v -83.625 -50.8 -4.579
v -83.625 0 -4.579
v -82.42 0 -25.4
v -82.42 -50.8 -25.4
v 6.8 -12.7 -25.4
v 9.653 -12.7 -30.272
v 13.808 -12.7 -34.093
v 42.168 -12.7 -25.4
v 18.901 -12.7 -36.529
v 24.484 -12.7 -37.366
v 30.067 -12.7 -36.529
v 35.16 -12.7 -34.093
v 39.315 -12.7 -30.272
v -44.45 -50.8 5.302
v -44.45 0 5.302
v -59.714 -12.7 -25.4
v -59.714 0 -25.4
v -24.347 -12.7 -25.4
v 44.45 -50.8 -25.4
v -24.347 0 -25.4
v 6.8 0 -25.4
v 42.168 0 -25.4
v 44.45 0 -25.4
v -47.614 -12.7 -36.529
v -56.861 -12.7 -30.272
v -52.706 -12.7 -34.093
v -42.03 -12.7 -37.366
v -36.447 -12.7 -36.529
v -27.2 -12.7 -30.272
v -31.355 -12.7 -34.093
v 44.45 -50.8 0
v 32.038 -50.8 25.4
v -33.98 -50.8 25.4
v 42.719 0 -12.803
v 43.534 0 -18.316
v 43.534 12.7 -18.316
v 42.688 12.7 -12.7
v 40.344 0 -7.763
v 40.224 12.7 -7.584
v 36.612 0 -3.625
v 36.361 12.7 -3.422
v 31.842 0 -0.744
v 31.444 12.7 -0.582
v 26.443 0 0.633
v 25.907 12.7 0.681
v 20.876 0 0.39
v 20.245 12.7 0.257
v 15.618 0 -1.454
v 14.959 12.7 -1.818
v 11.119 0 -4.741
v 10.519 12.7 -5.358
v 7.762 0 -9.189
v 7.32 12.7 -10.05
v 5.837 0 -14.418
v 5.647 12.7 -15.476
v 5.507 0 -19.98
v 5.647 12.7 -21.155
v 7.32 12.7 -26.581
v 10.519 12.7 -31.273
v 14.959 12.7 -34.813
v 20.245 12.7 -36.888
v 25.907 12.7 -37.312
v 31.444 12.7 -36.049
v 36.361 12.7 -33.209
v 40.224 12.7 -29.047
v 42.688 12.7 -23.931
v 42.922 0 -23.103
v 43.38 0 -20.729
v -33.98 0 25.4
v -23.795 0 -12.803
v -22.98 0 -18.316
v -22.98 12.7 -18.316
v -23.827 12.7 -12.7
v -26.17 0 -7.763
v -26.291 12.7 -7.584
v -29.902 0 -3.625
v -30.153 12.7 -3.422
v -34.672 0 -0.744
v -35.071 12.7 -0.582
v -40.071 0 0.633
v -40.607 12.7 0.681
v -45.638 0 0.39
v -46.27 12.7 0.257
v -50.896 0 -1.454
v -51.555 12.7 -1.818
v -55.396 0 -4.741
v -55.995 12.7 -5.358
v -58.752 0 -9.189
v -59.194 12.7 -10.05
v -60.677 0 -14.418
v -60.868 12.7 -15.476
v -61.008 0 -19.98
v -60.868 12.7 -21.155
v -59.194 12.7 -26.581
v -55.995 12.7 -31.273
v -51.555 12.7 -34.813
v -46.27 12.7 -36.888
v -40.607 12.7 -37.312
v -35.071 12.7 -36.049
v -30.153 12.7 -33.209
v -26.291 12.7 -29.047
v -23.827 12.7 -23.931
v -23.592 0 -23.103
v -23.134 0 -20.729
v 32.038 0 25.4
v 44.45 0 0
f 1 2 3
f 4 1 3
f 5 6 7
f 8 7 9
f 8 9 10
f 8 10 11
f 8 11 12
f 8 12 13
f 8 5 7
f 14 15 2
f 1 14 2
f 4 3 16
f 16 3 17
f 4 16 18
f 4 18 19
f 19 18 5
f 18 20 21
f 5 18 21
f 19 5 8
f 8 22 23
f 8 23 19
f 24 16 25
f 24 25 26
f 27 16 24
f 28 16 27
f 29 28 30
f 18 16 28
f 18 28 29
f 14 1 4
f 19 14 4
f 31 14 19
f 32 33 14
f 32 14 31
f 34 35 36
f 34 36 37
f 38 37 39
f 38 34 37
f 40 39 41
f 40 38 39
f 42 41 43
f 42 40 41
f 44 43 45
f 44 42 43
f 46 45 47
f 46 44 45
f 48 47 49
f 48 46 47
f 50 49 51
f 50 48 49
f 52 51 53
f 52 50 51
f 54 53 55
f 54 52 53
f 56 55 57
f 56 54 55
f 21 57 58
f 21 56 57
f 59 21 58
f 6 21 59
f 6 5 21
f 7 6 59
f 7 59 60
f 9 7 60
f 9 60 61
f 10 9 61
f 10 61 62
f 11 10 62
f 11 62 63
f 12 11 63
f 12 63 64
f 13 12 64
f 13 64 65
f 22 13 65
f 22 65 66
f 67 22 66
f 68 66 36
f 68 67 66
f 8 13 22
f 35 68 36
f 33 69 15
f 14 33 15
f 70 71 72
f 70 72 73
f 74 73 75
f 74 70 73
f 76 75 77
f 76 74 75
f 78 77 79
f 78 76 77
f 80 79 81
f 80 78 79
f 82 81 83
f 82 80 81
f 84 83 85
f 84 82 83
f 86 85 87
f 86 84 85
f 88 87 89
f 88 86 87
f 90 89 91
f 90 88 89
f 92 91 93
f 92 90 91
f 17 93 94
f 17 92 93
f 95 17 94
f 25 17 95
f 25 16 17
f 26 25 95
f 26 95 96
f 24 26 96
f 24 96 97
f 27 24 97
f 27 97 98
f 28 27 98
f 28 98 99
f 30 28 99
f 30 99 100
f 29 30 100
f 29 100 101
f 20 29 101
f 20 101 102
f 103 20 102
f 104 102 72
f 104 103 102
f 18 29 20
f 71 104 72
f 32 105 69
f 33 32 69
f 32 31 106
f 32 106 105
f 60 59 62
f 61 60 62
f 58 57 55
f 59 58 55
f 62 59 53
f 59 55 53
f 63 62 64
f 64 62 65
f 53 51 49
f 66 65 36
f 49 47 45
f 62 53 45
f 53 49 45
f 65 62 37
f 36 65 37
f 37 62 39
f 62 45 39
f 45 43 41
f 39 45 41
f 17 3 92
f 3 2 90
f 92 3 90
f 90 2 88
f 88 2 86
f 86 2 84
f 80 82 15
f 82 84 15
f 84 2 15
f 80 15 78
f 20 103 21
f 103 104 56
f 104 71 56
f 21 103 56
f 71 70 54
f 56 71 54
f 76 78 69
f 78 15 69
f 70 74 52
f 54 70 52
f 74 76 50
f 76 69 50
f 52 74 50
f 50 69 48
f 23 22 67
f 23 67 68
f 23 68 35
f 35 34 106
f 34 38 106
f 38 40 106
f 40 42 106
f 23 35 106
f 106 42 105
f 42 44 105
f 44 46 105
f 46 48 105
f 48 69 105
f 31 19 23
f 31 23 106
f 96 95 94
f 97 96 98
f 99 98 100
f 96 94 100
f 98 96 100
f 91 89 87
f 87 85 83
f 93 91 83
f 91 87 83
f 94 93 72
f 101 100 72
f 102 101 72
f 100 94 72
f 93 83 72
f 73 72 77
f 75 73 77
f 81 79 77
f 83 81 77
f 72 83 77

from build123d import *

# Parameters (mm, degrees)
F1_DEPTH = 50.8
F2_R     = 19.05
F3_DEPTH = 12.7
F4_DEPTH = 12.7


with BuildPart() as f1:
    # F0 (on Front) → F1 (new body)
    with BuildSketch(Plane.XZ):
        Polygon((-44.45, 5.3018676117), (-44.45, -25.4), (44.45, -25.4), (44.45, 0), (32.0377089083, 25.4), (-33.9801497757, 25.4), align=None)
        Polygon((-82.4199393392, -25.4), (-44.45, -25.4), (-44.45, 5.3018676117), (-83.6249068379, -4.5788856223), align=None)
    extrude(amount=F1_DEPTH)

    # F2 (on Front) → F3 (cut)
    with BuildSketch(Plane.XZ):
        with Locations((-42.0304983854, -18.3155424893)):
            Circle(F2_R)
        with BuildLine():
            ThreePointArc((5.4338427752, -18.3155424893), (24.4838427752, -37.3655424893), (43.5338427752, -18.3155424893))
            ThreePointArc((43.5338427752, -18.3155424893), (24.4838427752, 0.7344575107), (5.4338427752, -18.3155424893))
        make_face()
    extrude(amount=F3_DEPTH, mode=Mode.SUBTRACT)



with BuildPart() as f4:
    # F2 (on Front) → F4 (new body)
    with BuildSketch(Plane.XZ):
        with BuildLine():
            ThreePointArc((5.4338427752, -18.3155424893), (24.4838427752, -37.3655424893), (43.5338427752, -18.3155424893))
            ThreePointArc((43.5338427752, -18.3155424893), (24.4838427752, 0.7344575107), (5.4338427752, -18.3155424893))
        make_face()
    extrude(amount=F4_DEPTH)


with BuildPart() as f4b:
    # F2 (on Front) → F4, piece 2 (new body)
    with BuildSketch(Plane.XZ):
        with Locations((-42.0304983854, -18.3155424893)):
            Circle(F2_R)
    extrude(amount=F4_DEPTH)


with BuildPart() as f1_1:
    add(f1.part)

    add(f4.part)  # F5 merges F4

    add(f4b.part)  # F5 merges F4b
    # F5: F4b, F4 across plane
    add(f4b.part.mirror(Plane.XZ))
    add(f4.part.mirror(Plane.XZ))


solid = f1_1.part
